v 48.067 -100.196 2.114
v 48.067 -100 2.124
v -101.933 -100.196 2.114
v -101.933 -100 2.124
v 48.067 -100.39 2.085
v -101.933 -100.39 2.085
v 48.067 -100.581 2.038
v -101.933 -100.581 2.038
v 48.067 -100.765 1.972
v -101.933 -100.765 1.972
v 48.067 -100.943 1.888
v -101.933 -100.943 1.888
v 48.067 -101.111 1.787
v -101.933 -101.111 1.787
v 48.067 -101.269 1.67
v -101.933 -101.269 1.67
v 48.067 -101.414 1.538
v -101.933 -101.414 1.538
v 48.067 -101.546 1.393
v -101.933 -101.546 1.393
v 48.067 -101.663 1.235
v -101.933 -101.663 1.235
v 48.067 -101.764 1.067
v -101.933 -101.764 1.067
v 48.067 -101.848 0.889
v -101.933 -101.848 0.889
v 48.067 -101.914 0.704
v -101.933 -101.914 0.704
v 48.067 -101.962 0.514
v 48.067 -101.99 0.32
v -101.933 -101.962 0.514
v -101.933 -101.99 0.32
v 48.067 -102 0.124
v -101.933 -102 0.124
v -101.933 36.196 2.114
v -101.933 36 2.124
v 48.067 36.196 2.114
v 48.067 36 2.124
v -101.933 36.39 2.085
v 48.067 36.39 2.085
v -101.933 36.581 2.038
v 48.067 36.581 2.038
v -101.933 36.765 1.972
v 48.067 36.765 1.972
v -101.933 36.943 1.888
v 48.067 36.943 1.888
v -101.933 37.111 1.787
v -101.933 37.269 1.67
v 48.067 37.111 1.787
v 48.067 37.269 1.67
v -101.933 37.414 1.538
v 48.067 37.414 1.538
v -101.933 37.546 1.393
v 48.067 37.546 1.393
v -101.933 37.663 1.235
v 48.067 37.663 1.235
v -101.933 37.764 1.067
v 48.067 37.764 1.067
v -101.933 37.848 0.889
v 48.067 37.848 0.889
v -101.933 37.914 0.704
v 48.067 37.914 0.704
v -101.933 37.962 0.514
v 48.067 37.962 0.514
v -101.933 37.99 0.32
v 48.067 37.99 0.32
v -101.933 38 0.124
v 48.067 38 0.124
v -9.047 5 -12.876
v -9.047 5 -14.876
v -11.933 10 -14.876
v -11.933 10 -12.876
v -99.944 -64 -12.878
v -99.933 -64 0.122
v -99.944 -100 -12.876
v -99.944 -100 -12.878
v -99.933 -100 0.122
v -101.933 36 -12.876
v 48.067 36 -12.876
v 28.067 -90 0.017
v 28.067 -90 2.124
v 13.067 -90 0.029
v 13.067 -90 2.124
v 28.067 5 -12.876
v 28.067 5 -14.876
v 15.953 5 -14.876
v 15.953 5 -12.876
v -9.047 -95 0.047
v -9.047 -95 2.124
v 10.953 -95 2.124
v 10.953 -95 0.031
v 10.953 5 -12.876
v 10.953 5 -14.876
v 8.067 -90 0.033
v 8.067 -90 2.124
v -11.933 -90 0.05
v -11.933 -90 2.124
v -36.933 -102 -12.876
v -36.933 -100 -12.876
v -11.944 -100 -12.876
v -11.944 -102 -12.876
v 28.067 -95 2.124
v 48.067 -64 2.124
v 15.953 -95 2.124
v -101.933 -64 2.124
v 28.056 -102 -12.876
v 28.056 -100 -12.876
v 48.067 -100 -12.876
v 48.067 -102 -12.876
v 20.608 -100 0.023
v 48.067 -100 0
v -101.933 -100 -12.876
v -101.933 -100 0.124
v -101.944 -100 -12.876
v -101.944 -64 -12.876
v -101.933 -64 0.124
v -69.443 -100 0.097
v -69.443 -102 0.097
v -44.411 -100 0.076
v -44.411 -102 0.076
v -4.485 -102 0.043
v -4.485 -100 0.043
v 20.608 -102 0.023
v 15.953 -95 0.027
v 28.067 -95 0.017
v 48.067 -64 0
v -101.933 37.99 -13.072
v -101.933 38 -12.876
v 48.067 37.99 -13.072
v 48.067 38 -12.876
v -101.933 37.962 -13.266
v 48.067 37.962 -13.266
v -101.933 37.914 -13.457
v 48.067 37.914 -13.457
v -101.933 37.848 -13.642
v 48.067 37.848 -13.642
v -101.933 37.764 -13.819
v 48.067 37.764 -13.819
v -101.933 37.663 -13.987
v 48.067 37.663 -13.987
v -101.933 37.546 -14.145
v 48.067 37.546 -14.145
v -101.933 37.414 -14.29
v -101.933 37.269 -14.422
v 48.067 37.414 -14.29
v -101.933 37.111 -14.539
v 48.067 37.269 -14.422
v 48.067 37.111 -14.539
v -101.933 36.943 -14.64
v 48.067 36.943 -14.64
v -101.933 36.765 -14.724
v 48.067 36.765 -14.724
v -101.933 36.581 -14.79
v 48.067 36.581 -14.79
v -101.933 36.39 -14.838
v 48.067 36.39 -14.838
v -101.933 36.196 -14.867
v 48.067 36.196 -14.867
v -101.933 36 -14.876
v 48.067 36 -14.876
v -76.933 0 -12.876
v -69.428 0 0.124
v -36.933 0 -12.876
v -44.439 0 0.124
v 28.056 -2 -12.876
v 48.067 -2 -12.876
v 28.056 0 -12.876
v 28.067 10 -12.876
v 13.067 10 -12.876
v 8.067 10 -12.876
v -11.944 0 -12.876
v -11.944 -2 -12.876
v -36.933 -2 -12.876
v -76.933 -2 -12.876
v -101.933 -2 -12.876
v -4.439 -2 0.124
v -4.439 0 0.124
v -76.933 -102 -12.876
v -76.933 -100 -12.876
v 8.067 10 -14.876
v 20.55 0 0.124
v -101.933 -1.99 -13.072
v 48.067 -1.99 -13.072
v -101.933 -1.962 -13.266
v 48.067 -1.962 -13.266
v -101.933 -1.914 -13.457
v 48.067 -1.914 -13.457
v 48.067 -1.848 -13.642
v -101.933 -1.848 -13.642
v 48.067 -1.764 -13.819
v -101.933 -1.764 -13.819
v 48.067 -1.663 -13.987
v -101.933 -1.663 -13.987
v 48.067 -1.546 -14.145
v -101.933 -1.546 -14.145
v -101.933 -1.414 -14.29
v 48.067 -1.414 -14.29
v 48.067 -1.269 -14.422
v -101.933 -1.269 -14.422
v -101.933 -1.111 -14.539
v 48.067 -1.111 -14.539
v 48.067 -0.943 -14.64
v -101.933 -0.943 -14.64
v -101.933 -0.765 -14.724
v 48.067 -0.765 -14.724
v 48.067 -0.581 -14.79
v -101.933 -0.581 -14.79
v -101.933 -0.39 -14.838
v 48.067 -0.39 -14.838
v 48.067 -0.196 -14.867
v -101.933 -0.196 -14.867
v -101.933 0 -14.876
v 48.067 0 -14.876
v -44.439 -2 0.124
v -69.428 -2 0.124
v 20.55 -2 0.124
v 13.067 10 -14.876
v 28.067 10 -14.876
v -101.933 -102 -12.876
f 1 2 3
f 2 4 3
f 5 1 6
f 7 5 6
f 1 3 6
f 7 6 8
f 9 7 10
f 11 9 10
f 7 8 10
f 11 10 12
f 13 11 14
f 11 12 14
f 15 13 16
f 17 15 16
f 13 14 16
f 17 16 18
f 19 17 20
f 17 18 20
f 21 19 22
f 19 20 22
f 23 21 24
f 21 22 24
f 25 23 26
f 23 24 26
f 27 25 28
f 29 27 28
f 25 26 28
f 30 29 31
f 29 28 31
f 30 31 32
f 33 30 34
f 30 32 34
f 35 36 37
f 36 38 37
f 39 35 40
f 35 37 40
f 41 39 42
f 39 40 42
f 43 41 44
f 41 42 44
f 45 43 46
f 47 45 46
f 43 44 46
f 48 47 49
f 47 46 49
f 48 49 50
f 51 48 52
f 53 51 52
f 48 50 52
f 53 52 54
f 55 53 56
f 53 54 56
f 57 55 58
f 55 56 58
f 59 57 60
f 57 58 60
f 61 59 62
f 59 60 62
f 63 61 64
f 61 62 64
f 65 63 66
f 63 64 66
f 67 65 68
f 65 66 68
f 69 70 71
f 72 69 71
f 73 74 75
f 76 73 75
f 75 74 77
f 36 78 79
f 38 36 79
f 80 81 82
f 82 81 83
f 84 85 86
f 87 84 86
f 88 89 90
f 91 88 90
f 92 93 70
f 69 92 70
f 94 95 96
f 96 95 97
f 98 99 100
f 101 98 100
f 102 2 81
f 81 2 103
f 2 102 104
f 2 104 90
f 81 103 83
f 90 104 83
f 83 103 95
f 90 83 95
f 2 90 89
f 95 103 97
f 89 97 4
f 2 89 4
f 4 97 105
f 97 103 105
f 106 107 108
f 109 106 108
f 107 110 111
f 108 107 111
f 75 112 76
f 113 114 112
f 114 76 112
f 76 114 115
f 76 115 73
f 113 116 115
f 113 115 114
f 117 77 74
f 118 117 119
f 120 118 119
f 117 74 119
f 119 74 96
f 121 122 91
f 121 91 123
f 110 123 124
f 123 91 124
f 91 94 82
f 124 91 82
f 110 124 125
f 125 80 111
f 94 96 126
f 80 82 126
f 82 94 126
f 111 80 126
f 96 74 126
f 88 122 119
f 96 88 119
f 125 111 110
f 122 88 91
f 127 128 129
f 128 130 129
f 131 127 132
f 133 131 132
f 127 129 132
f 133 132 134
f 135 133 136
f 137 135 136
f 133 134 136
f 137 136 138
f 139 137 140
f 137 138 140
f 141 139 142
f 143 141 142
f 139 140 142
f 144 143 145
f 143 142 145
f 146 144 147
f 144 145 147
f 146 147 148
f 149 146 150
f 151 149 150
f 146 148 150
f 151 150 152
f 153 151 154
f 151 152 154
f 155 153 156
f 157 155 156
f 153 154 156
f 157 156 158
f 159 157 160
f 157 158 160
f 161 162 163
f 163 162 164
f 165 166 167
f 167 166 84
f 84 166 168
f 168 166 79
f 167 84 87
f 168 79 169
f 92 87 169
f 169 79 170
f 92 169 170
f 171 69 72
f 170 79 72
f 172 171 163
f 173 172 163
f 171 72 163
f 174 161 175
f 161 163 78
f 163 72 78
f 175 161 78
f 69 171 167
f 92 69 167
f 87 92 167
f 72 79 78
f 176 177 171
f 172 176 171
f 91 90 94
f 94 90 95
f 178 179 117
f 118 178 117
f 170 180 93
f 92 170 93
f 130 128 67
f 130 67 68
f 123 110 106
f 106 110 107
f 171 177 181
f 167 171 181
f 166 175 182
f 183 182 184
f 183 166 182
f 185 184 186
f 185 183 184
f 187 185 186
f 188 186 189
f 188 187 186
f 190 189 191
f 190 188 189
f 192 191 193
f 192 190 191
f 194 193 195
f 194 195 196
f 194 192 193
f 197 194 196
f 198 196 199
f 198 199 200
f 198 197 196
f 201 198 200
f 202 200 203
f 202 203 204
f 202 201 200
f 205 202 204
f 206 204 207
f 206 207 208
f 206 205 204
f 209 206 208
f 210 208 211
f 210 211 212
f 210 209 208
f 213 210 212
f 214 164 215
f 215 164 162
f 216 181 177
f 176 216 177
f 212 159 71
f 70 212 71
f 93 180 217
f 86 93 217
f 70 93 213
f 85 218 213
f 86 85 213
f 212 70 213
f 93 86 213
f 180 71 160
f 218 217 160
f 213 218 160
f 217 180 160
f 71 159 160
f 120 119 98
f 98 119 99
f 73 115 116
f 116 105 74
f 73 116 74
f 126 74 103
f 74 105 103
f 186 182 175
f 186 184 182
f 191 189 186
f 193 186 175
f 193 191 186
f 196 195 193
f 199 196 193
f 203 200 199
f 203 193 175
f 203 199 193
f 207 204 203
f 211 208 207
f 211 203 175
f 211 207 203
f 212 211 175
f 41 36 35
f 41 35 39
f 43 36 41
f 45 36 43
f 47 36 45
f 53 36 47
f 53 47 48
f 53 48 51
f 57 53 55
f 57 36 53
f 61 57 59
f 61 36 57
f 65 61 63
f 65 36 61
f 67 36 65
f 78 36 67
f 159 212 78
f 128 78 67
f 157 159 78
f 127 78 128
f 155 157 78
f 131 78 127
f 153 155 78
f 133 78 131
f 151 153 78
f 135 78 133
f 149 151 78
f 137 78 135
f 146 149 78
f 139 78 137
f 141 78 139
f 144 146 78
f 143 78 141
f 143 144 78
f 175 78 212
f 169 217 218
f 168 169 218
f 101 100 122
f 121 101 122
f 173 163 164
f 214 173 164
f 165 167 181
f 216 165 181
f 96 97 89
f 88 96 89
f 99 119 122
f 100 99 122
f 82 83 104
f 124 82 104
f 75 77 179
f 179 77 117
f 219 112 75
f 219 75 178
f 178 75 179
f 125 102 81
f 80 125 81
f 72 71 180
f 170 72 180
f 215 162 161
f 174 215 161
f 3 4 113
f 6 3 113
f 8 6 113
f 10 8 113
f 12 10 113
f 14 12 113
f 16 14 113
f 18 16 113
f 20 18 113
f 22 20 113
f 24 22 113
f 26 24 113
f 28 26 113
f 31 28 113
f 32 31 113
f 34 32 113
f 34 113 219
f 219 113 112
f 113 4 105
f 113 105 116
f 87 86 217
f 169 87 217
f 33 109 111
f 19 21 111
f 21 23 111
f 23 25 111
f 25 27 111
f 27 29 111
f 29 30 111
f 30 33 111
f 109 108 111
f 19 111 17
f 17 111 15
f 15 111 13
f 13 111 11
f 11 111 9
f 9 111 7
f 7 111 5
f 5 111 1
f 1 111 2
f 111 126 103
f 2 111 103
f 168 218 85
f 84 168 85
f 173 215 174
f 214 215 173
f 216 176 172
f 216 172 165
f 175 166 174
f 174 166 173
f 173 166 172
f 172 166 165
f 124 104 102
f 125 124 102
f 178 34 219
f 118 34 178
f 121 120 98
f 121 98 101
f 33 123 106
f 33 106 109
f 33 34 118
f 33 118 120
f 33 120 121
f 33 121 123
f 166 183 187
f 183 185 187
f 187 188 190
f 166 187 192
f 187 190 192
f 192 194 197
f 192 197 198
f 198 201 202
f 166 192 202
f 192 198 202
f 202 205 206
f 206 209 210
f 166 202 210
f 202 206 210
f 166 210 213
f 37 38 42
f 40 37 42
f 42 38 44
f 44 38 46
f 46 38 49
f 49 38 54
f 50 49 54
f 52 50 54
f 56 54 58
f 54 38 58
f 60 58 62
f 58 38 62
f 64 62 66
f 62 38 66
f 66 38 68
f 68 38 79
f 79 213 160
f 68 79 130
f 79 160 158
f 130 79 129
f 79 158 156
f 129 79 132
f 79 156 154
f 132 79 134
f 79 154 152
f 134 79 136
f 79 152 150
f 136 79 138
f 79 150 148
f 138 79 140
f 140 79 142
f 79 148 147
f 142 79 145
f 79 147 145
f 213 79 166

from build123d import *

# Parameters (mm, degrees)
F1_DEPTH  = 2
F4_DEPTH  = 2
F7_DEPTH  = 38
F10_DEPTH = 38
F11_W     = 150
F11_H     = 2
F12_DEPTH = 15
F13_W     = 2
F13_H     = 36
F14_DEPTH = 13
F16_DEPTH = 25
F18_DEPTH = 25
F19_R     = 1.99999
F19_2_R   = 1.99999
F20_R     = 1.99999


# Not quite as in the source:
# - a fillet or chamfer is up to 0.001 mm smaller than in the source, because OpenCascade refuses the exact size


with BuildPart() as f1:
    # F0 (on Front) → F1 (new body)
    with BuildSketch(Plane.XZ):
        Polygon((-76.9333613626, -12.8761603036), (-101.9333613626, -12.8761603036), (-101.9333613626, -14.8761603036), (48.0666386374, -14.8761603036), (48.0666386374, -12.8761603036), (28.0555316385, -12.8761603036), (20.549978139, 0.1238396964), (-4.438914862, 0.1238396964), (-11.9444683615, -12.8761603036), (-36.9333613626, -12.8761603036), (-44.438914862, 0.1238396964), (-69.4278078631, 0.1238396964), align=None)
    extrude(amount=F1_DEPTH)

    # F6 (on offset) → F7 (join, through all)
    with BuildSketch(Plane.XZ.offset(-38)):
        Polygon((-36.9333613626, -12.8761603036), (-76.9333613626, -12.8761603036), (-101.9333613626, -12.8761603036), (-101.9333613626, -14.8761603036), (48.0666386374, -14.8761603036), (48.0666386374, -12.8761603036), (28.0555316385, -12.8761603036), (-11.9444683615, -12.8761603036), align=None)
    extrude(amount=F7_DEPTH)

    # F11 (on face) → F12 (join)
    with BuildSketch(Plane.XY.offset(-12.8761603036)):
        with Locations((-26.9333613626, 37)):
            Rectangle(F11_W, F11_H)
    extrude(amount=F12_DEPTH)

    # F17 (on face) → F18 (cut)
    with BuildSketch(Plane(origin=(0, 0, -14.8761603036), x_dir=(1, 0, 0), z_dir=(0, 0, -1))):
        Polygon((-11.9333613626, -10), (8.0666386374, -10), (10.9533899834, -5), (-9.0466100166, -5), align=None)
        Polygon((13.0666386374, -10), (28.0666386374, -10), (28.0666386374, -5), (15.9533899834, -5), align=None)
    extrude(amount=-F18_DEPTH, mode=Mode.SUBTRACT)

    # F19 (radius 2 in the source; OpenCascade refuses exactly that, so slightly less here)
    f19_edges = [f1.edges().sort_by_distance(p)[0] for p in [
        (-26.933361, 38, -14.87616),
        (-26.933361, 38, 2.12384),
    ]]
    fillet(f19_edges, radius=F19_R)

    # F20 (radius 2 in the source; OpenCascade refuses exactly that, so slightly less here)
    f20_edges = [f1.edges().sort_by_distance(p)[0] for p in [
        (-26.933361, -2, -14.87616),
    ]]
    fillet(f20_edges, radius=F20_R)


with BuildPart() as f4:
    # F3 (on offset) → F4 (new body)
    with BuildSketch(Plane.XZ.offset(100)):
        Polygon((-101.9333613626, 0.1238396964), (-101.9333613626, -12.8761603036), (-76.9333613626, -12.8761603036), (-69.4278078631, 0.1238396964), (-44.438914862, 0.1238396964), (-36.9333613626, -12.8761603036), (-11.9444683615, -12.8761603036), (-4.438914862, 0.1238396964), (20.549978139, 0.1238396964), (28.0555316385, -12.8761603036), (48.0666386374, -12.8761603036), (48.0666386374, 0.1238396964), (48.0666386374, 2.1238396964), (-101.9333613626, 2.1238396964), align=None)
    extrude(amount=F4_DEPTH)

    # F9 (on offset) → F10 (join)
    with BuildSketch(Plane.XZ.offset(64)):
        Polygon((48.0666386374, 2.1238396964), (-101.9333613626, 2.1238396964), (-101.9333613626, 0.1238396964), (-69.4432945528, 0.097015963), (-44.4114965352, 0.0763497612), (-4.4853643477, 0.0433868273), (20.6083887933, 0.0226694755), (48.0666386374, 0), align=None)
    extrude(amount=F10_DEPTH)

    # F13 (on face) → F14 (join)
    with BuildSketch(Plane(origin=(3.27628e-05, 0, 0.0396836925), x_dir=(0.9999996592, 0, -0.0008255977), z_dir=(-0.0008255977, 0, -0.9999996592))):
        with Locations((-100.9334288649, 82)):
            Rectangle(F13_W, F13_H)
    extrude(amount=F14_DEPTH)

    # F15 (on face) → F16 (cut)
    with BuildSketch(Plane.XY.offset(2.1238396964)):
        Polygon((10.9533899834, -95), (8.0666386374, -90), (-11.9333613626, -90), (-9.0466100166, -95), align=None)
        Polygon((28.0666386374, -95), (28.0666386374, -90), (13.0666386374, -90), (15.9533899834, -95), align=None)
    extrude(amount=-F16_DEPTH, mode=Mode.SUBTRACT)

    # F19#2 (radius 2 in the source; OpenCascade refuses exactly that, so slightly less here)
    f19_2_edges = [f4.edges().sort_by_distance(p)[0] for p in [
        (-26.933361, -102, 2.12384),
    ]]
    fillet(f19_2_edges, radius=F19_2_R)


solid = Compound([f1.part, f4.part])
